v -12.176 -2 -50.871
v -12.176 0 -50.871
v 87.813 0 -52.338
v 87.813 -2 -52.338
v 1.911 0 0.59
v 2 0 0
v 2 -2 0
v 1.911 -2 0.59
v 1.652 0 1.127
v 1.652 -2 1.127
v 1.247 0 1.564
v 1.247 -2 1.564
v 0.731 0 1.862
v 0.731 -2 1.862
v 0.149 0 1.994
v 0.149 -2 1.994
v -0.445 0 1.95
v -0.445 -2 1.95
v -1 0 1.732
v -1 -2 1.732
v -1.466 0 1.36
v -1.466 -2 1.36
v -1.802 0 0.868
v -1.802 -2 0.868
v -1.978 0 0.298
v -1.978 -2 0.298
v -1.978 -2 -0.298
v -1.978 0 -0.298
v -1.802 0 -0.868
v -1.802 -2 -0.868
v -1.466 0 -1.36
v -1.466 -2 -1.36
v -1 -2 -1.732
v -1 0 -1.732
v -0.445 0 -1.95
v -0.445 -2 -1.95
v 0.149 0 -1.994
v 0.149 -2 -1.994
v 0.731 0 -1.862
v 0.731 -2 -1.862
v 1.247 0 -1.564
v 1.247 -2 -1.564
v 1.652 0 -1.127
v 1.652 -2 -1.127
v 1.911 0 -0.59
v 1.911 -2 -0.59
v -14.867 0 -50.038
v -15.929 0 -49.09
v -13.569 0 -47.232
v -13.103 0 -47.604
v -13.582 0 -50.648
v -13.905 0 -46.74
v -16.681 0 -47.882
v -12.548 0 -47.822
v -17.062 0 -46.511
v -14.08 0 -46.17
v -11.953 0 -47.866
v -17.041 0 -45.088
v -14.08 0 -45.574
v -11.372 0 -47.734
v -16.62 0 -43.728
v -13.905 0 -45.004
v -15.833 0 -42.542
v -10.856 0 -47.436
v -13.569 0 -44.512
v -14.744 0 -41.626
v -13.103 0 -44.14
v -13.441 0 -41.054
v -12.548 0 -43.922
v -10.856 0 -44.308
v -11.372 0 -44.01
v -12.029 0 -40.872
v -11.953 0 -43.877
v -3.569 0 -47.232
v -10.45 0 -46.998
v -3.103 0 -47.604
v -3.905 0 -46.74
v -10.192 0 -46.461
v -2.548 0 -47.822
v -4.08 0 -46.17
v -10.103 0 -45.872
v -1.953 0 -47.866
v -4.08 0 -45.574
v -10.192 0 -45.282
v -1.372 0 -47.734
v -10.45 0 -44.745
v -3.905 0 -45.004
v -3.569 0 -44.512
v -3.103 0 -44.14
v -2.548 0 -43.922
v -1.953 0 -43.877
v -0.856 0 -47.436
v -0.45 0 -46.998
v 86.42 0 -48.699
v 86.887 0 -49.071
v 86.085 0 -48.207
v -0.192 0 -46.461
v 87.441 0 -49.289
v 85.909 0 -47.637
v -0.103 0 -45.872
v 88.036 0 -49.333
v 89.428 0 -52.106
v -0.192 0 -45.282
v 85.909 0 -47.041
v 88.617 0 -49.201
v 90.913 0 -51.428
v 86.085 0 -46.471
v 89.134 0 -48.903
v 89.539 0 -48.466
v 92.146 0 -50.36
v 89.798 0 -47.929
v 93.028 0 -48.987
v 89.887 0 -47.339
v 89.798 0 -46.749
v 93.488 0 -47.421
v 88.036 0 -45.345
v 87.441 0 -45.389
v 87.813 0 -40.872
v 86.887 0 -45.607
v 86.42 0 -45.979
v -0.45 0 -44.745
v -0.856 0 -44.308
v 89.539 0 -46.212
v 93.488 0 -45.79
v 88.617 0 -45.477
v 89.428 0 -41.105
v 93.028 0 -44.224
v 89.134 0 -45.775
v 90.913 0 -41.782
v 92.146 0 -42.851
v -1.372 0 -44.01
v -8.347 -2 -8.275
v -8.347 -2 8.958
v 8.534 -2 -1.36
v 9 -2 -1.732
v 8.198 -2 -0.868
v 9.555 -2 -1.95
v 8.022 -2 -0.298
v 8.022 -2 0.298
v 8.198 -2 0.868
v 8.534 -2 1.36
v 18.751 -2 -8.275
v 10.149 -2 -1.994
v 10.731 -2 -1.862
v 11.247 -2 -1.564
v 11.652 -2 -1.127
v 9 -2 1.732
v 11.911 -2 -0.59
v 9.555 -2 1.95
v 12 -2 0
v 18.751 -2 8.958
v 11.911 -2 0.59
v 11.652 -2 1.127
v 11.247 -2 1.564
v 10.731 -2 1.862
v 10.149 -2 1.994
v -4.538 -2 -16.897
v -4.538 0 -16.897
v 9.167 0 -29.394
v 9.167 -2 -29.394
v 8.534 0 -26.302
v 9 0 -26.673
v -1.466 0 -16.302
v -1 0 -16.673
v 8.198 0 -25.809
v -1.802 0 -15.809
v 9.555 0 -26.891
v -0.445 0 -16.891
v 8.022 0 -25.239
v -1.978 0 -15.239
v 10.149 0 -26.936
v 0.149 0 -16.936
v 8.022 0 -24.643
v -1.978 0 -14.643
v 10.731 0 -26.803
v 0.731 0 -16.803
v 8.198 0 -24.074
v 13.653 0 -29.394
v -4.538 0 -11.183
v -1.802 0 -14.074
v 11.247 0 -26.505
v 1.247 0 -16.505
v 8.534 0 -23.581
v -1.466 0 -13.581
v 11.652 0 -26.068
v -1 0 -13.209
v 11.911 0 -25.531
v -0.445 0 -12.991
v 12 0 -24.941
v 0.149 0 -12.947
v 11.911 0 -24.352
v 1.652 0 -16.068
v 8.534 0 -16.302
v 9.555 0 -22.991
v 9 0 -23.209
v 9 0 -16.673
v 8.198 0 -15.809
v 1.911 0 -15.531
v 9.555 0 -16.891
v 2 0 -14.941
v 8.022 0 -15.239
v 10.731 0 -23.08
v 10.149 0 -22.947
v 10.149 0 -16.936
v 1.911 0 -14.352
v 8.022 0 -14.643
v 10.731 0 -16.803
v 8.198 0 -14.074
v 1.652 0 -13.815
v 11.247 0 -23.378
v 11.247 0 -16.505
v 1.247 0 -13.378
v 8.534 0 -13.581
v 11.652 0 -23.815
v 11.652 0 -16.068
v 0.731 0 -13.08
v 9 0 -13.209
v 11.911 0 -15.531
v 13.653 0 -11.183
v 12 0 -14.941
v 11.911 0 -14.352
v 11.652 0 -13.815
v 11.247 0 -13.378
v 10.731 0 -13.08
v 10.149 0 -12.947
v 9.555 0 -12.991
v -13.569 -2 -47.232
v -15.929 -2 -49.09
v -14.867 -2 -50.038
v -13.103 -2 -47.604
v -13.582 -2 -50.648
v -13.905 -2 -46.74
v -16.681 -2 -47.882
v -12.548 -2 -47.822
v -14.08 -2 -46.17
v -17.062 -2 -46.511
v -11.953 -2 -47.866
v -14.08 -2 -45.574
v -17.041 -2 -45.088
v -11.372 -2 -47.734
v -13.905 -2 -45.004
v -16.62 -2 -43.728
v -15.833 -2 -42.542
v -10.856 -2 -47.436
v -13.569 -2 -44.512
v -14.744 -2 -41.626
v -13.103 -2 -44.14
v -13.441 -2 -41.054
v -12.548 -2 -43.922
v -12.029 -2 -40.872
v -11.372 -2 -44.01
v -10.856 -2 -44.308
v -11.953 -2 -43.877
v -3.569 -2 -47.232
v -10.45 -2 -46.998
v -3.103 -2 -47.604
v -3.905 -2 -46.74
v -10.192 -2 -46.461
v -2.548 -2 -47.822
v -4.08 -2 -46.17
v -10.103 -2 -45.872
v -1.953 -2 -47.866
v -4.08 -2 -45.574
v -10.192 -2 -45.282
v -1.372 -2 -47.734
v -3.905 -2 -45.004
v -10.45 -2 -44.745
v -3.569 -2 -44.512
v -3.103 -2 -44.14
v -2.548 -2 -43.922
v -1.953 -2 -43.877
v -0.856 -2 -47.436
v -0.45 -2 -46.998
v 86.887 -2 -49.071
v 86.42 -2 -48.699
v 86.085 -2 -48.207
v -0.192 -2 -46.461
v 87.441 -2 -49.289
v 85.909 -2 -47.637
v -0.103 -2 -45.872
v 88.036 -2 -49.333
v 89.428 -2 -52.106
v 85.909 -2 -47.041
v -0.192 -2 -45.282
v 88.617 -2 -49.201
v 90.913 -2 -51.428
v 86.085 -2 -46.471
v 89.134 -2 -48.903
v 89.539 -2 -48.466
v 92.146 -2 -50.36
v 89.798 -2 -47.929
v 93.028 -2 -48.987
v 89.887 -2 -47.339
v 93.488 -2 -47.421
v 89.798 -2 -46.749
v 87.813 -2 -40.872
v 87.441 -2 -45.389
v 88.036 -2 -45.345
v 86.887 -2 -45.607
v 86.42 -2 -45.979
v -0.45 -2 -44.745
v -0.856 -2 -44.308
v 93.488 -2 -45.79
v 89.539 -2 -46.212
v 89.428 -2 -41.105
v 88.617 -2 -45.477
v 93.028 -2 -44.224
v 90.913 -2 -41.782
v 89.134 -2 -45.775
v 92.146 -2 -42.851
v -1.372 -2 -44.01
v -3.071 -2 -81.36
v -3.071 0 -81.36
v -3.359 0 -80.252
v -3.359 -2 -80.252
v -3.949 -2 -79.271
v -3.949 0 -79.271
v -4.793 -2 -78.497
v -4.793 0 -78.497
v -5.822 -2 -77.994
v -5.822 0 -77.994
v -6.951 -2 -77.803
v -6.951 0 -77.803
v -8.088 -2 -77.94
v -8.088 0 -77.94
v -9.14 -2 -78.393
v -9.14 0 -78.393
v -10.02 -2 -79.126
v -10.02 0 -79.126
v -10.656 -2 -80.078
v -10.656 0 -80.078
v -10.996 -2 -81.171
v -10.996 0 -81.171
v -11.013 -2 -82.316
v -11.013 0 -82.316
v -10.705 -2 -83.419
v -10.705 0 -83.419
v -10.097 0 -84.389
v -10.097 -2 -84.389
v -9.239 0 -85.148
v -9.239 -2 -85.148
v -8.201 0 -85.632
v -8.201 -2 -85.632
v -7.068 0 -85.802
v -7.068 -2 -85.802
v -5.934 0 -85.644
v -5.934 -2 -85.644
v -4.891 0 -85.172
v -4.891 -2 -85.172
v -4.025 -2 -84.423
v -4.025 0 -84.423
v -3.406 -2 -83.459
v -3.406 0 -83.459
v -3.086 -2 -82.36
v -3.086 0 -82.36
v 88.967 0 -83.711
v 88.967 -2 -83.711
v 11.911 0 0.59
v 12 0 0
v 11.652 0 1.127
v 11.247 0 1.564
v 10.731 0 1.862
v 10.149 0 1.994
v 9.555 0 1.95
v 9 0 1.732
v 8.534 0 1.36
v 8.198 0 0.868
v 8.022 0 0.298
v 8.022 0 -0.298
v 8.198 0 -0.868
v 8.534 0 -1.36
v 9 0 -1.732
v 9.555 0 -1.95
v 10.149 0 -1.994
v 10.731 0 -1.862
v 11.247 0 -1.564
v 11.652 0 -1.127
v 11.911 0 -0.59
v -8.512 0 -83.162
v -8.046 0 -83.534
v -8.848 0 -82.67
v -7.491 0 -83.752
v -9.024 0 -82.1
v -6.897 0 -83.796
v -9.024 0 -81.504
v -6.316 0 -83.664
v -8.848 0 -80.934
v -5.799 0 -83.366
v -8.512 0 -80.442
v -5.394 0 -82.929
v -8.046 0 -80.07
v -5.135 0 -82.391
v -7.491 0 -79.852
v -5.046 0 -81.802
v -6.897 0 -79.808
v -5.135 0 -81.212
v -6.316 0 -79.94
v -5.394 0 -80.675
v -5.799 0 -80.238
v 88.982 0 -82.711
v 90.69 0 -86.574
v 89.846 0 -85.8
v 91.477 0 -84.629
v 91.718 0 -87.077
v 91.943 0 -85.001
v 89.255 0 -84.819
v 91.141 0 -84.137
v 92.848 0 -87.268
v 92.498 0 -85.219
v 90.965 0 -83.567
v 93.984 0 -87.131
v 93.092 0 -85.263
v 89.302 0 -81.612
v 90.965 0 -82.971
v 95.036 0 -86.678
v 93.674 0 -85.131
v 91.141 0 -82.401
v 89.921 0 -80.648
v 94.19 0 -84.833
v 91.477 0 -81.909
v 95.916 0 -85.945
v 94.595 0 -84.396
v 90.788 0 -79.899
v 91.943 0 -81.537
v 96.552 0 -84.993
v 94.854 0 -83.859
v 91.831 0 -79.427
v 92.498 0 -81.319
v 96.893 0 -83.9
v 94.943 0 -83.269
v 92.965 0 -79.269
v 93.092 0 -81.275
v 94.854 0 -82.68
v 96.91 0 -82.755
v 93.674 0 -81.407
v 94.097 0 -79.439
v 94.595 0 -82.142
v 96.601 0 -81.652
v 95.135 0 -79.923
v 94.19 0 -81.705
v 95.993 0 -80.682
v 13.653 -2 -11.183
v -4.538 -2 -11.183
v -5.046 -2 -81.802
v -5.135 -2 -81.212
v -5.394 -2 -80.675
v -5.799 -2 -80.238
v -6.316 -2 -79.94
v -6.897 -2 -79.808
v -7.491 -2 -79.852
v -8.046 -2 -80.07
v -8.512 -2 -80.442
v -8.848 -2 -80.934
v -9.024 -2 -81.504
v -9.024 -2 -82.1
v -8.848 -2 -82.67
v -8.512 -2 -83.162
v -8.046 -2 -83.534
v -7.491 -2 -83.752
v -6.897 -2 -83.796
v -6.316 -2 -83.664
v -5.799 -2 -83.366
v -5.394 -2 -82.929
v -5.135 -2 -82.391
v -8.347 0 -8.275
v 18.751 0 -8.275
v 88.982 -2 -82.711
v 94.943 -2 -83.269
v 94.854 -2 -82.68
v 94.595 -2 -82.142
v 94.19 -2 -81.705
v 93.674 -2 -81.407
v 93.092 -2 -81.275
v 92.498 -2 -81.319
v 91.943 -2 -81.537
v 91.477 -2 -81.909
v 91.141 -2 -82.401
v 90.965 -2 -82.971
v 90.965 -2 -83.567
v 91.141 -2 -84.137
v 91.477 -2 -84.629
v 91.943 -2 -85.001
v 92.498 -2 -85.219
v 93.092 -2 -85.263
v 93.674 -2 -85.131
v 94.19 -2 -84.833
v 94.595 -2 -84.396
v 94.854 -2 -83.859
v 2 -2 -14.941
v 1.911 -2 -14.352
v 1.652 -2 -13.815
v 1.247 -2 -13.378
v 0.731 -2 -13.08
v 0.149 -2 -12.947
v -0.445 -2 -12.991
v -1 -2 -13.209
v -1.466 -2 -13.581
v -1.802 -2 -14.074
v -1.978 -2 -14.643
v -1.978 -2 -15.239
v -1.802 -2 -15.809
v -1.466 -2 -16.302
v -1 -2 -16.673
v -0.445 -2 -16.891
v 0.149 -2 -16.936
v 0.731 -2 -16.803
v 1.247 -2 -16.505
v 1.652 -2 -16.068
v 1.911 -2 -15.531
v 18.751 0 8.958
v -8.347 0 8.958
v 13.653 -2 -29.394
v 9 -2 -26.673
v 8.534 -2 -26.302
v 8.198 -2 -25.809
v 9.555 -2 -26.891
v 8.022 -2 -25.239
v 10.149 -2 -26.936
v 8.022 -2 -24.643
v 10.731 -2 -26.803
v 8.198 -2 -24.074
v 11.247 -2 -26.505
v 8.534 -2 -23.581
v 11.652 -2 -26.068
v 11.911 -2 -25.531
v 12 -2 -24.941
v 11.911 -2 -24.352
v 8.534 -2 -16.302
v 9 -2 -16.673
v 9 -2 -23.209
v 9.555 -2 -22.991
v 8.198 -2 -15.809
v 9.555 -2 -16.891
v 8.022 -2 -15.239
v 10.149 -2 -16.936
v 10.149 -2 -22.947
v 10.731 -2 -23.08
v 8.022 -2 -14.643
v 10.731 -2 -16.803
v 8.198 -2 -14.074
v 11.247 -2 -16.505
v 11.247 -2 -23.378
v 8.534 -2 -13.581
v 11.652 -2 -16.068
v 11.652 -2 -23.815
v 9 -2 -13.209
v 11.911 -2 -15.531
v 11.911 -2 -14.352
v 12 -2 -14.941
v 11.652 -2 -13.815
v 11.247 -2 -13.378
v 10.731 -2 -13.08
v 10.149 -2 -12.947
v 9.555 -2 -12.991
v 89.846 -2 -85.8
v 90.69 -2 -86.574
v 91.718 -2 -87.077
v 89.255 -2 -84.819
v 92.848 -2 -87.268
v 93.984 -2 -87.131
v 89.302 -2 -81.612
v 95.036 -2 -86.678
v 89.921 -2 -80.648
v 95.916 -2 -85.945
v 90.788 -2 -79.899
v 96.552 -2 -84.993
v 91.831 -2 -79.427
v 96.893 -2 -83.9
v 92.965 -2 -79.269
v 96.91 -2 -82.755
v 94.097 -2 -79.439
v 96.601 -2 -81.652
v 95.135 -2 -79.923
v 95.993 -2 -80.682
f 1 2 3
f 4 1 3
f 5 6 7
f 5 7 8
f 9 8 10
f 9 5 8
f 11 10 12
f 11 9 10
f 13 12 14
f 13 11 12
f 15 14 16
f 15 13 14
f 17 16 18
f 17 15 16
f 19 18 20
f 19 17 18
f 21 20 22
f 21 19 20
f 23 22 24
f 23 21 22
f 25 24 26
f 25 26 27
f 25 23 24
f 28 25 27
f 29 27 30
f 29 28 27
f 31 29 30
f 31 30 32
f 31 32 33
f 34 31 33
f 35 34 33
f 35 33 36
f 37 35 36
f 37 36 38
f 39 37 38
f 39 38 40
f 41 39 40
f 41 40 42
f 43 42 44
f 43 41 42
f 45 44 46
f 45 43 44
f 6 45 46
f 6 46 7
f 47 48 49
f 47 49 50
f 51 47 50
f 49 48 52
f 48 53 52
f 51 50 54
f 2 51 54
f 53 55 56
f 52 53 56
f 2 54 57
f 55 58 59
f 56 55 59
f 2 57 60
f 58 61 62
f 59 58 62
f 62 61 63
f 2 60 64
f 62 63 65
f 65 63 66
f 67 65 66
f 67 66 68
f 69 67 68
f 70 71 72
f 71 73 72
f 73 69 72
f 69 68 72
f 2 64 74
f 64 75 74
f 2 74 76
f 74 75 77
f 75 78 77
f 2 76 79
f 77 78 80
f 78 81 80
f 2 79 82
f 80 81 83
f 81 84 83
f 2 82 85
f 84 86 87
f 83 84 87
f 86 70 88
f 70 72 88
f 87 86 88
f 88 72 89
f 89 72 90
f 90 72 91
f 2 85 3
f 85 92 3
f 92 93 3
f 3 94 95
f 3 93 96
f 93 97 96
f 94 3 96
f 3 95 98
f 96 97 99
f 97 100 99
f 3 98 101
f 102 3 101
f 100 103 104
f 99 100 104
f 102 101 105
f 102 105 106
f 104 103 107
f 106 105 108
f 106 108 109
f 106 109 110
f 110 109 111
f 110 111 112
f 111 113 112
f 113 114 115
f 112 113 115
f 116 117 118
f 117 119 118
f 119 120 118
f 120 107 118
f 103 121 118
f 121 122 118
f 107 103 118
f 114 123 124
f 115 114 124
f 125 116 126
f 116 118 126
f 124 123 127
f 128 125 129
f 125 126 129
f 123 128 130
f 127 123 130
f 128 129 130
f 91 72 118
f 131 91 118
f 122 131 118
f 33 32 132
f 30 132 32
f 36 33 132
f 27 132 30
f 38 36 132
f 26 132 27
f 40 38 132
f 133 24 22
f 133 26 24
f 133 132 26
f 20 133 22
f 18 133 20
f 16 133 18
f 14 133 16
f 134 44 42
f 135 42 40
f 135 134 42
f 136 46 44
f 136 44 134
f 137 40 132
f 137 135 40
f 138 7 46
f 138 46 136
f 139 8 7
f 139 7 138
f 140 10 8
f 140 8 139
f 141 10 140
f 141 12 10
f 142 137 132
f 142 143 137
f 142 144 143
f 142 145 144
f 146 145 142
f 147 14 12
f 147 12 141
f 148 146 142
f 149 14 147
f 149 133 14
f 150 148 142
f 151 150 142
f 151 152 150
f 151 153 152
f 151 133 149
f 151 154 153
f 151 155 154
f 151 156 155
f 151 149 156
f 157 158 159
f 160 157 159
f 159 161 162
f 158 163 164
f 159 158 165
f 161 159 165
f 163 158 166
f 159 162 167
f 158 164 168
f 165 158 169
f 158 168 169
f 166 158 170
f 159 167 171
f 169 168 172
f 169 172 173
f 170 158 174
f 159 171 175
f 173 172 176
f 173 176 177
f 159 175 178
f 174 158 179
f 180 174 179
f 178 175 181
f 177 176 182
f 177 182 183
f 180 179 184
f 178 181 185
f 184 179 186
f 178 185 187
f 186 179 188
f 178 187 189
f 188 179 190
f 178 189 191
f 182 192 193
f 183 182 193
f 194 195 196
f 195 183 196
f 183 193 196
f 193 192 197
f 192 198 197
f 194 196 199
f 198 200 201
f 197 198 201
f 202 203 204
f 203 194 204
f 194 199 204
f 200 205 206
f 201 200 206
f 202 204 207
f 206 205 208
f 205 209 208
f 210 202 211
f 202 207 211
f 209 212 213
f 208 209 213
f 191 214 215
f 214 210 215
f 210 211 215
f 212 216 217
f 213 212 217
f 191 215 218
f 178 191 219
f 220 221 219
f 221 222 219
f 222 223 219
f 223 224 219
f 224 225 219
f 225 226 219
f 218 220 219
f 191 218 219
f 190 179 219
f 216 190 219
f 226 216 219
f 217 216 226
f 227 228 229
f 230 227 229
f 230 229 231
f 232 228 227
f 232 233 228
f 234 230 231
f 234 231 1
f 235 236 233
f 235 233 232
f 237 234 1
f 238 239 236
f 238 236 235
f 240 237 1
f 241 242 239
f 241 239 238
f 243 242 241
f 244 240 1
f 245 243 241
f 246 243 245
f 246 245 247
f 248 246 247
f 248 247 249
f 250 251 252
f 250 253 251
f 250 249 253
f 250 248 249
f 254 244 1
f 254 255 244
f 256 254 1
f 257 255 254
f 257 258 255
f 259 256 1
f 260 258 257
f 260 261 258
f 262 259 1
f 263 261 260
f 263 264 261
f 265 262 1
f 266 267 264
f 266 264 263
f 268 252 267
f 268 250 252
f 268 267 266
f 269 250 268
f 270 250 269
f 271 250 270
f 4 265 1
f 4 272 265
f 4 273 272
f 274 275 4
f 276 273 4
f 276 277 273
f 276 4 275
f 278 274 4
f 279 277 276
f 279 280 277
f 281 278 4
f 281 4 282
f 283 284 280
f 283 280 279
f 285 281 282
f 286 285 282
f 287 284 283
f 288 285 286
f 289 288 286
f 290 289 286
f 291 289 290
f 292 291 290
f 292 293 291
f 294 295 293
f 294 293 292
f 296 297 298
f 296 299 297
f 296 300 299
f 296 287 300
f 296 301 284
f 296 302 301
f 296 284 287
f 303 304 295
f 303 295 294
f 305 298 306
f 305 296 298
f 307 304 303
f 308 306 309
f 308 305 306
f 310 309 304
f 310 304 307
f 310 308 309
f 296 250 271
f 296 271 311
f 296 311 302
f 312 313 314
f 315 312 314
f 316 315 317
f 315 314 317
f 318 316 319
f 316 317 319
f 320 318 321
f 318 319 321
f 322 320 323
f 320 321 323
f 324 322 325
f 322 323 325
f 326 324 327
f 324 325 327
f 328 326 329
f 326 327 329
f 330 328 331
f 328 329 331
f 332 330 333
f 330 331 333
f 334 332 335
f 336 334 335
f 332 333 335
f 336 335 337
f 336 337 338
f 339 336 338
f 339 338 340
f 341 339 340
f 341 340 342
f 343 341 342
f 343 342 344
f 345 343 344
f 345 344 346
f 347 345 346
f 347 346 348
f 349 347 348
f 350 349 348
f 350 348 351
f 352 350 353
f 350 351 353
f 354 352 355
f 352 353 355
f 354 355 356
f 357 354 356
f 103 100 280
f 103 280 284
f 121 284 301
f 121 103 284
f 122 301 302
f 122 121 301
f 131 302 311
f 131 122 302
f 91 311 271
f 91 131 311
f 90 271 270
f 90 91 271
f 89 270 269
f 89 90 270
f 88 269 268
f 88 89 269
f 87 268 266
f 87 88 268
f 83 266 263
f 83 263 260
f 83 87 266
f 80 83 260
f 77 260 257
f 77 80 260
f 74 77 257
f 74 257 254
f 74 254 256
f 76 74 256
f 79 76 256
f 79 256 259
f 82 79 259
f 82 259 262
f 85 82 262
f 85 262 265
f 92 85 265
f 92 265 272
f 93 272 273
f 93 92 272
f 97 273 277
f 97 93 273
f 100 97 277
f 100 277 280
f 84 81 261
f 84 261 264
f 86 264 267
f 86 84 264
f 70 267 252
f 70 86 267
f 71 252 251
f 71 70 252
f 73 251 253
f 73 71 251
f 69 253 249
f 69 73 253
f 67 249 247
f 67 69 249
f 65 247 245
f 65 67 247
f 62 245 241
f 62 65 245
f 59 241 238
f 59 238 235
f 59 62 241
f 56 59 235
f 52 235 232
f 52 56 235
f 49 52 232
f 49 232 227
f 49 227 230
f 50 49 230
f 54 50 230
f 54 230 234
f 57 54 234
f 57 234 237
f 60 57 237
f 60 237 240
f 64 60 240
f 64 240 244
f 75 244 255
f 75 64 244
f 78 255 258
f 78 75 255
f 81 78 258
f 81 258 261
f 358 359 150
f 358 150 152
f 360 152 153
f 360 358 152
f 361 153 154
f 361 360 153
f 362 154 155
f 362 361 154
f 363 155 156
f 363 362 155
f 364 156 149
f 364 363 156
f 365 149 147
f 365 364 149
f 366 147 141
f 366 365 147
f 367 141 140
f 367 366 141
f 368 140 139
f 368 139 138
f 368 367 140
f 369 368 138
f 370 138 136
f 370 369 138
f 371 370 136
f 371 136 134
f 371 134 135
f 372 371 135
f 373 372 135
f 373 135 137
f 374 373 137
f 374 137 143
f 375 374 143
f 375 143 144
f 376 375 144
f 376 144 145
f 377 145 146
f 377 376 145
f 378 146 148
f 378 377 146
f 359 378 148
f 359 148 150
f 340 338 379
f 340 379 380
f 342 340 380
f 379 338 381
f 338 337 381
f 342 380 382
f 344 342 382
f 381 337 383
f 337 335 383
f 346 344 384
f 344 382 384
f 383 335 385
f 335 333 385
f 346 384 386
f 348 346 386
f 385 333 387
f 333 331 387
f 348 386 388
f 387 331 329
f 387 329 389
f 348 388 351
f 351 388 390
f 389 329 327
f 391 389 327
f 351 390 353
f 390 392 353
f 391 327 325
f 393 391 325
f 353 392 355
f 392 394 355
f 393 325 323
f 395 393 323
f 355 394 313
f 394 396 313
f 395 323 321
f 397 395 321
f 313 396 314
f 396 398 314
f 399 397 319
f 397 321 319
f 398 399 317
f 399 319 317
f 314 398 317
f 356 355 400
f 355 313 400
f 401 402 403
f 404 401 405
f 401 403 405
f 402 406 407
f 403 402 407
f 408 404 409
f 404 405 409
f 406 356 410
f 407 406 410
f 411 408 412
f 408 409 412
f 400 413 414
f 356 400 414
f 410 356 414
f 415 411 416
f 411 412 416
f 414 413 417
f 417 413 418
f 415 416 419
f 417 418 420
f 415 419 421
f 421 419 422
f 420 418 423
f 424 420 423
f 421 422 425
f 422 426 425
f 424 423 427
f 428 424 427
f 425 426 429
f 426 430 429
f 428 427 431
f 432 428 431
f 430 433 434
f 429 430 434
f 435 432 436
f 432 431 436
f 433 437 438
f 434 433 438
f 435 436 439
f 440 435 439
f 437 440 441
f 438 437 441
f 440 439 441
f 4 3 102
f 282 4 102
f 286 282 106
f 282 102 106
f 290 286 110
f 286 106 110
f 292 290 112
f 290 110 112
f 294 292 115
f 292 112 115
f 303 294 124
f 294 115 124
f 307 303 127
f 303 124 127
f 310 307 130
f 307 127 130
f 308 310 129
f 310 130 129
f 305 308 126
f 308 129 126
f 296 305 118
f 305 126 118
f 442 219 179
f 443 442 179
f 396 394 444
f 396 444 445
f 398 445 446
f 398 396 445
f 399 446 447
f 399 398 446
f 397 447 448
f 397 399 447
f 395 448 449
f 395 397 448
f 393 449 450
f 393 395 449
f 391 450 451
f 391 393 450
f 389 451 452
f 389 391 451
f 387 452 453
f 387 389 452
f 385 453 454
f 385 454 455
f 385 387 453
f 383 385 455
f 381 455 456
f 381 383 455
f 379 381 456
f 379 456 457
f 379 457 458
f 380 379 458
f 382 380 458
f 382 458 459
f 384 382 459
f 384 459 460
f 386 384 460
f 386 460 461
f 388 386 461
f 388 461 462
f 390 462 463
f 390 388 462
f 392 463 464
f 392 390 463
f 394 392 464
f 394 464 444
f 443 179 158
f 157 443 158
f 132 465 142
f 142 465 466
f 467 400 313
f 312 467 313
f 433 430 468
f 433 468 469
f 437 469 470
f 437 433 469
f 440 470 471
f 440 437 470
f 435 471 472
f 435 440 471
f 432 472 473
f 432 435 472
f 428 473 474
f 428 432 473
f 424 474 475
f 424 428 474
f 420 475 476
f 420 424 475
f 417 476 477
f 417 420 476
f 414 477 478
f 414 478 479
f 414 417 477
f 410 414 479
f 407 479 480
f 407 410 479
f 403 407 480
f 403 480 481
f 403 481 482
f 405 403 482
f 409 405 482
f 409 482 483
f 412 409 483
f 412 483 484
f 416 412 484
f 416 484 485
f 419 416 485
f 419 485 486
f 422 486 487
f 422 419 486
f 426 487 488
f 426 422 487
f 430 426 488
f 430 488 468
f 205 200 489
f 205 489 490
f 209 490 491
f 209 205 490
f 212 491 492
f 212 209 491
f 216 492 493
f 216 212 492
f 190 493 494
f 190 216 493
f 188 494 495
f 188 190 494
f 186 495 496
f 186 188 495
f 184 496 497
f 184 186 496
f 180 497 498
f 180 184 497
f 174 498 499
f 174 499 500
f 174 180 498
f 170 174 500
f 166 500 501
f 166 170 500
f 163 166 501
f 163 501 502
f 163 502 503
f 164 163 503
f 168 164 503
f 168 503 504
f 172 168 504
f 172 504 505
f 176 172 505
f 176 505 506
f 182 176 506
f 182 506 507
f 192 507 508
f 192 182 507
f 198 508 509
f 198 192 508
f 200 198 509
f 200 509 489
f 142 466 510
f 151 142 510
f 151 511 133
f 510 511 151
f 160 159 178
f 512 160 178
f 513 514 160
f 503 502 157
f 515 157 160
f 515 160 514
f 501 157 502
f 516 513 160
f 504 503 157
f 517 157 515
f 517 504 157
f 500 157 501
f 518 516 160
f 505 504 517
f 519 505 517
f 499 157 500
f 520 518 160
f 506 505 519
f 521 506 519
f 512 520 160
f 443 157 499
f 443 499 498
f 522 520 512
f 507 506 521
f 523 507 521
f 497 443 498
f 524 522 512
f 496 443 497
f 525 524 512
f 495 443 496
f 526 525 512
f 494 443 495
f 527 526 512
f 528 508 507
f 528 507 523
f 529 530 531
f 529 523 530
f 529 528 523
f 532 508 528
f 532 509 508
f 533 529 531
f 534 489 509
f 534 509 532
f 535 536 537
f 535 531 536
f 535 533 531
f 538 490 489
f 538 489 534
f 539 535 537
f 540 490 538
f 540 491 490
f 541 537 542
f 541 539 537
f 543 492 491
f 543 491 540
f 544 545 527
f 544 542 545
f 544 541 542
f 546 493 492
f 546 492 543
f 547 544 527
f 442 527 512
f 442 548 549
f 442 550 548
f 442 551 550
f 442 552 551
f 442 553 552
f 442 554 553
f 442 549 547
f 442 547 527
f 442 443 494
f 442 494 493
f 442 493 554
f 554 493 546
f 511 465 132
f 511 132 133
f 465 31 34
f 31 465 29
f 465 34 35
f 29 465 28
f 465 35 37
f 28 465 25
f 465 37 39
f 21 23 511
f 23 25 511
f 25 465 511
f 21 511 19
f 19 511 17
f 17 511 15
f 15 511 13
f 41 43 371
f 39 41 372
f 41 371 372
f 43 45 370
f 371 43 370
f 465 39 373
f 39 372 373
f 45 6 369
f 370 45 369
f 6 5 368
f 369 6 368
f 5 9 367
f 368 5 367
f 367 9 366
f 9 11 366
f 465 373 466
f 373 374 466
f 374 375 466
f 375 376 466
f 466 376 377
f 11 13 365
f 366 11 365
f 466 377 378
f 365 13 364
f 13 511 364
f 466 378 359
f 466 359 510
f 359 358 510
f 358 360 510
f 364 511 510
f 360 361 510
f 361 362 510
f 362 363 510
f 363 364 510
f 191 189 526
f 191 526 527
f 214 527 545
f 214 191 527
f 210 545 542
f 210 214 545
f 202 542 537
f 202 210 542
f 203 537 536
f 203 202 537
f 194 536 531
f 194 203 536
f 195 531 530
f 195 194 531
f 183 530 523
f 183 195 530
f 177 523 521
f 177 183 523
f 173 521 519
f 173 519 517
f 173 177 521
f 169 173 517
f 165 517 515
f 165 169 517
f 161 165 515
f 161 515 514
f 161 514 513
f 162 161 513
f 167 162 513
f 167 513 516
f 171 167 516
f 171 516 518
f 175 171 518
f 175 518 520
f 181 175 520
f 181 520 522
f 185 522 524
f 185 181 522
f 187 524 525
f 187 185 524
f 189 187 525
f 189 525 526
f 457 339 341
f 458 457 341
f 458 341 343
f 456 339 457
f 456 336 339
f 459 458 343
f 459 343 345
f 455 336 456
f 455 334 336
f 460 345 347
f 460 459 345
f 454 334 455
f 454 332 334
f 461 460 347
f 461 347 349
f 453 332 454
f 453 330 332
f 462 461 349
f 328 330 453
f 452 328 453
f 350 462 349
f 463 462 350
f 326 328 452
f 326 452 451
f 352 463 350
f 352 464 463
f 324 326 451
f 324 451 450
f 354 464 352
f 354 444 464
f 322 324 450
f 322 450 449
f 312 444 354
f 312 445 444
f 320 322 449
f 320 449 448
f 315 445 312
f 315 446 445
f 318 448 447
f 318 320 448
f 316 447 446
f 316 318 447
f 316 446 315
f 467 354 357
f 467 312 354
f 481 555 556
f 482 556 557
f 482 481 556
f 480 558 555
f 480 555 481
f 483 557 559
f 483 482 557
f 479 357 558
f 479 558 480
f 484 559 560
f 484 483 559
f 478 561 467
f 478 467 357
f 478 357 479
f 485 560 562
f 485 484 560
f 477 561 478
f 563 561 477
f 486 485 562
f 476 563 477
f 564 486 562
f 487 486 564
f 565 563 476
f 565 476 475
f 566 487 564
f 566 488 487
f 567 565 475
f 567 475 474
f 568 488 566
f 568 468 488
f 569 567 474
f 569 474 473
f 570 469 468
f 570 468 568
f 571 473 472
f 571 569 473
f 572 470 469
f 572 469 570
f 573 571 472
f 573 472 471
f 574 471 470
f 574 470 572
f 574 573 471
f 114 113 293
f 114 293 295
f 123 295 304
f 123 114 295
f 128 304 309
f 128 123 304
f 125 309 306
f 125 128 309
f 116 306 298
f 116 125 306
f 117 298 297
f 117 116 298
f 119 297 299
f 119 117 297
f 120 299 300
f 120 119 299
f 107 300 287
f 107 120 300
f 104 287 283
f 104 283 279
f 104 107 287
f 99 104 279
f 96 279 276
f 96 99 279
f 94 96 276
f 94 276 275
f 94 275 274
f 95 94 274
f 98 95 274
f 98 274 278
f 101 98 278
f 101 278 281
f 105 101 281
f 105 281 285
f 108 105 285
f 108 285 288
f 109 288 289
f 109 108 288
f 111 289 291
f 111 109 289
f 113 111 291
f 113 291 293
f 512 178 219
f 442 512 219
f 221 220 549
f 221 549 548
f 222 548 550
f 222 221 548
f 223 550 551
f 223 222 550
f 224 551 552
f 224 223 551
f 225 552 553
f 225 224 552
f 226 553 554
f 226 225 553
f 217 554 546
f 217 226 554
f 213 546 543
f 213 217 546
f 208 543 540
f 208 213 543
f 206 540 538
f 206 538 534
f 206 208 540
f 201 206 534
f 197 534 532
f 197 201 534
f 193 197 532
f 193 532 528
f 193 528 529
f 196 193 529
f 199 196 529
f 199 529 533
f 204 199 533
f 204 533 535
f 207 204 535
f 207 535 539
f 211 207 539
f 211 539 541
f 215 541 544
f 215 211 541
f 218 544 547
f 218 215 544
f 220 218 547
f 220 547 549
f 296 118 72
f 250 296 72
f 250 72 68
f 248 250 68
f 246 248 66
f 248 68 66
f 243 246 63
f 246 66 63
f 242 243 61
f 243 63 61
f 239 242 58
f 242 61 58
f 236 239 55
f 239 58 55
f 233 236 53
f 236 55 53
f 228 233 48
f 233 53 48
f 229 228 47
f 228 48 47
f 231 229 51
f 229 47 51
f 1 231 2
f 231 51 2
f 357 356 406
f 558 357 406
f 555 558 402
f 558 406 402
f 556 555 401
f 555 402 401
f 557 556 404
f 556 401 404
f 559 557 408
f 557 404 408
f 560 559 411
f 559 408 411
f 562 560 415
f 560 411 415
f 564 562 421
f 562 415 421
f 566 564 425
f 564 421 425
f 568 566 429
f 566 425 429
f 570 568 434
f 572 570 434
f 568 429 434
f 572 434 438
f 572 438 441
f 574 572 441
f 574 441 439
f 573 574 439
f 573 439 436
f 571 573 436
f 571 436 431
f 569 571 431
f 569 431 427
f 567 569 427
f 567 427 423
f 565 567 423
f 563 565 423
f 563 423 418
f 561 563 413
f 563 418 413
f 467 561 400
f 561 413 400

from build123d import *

# Parameters (mm, degrees)
F0_W     = 27.097531
F0_H     = 17.233416
F0_R     = 2
F1_DEPTH = 2
F2_R     = 2
F3_DEPTH = 2
F4_R     = 2
F5_DEPTH = 2
F6_R     = 2
F7_DEPTH = 2


with BuildPart() as f1:
    # F0 (on Front) → F1 (new body)
    with BuildSketch(Plane.XZ):
        with Locations((5.201902, 0.341227)):
            Rectangle(F0_W, F0_H)
        Circle(F0_R, mode=Mode.SUBTRACT)
        with Locations((10, 0)):
            Circle(F0_R, mode=Mode.SUBTRACT)
    extrude(amount=F1_DEPTH)


with BuildPart() as f3:
    # F2 (on Front) → F3 (new body)
    with BuildSketch(Plane.XZ):
        Polygon((13.652718, -11.182562), (-4.537523, -11.182562), (-4.537523, -16.897279), (9.166907, -29.393673), (13.652718, -29.393673), align=None)
        with Locations((10, -24.941308)):
            Circle(F2_R, mode=Mode.SUBTRACT)
        with Locations((0, -14.941308)):
            Circle(F2_R, mode=Mode.SUBTRACT)
        with Locations((10, -14.941308)):
            Circle(F2_R, mode=Mode.SUBTRACT)
    extrude(amount=F3_DEPTH)


with BuildPart() as f5:
    # F4 (on Front) → F5 (new body)
    with BuildSketch(Plane.XZ):
        with BuildLine():
            Line((87.813167, -40.872386), (-12.029353, -40.872386))
            ThreePointArc((-12.029353, -40.872386), (-17.102173, -45.79849), (-12.176069, -50.87131))
            Line((-12.176069, -50.87131), (87.813167, -52.33847))
            ThreePointArc((87.813167, -52.33847), (93.546209, -46.605428), (87.813167, -40.872386))
        make_face()
        with Locations((87.886525, -47.339007)):
            Circle(F4_R, mode=Mode.SUBTRACT)
        with Locations((-12.102711, -45.871848)):
            Circle(F4_R, mode=Mode.SUBTRACT)
        with Locations((-2.102711, -45.871848)):
            Circle(F4_R, mode=Mode.SUBTRACT)
    extrude(amount=F5_DEPTH)


with BuildPart() as f7:
    # F6 (on Front) → F7 (new body)
    with BuildSketch(Plane.XZ):
        with BuildLine():
            ThreePointArc((88.967314, -83.710812), (96.942419, -83.327779), (88.981985, -82.71092))
            Line((88.981985, -82.71092), (-3.070852, -81.360213))
            ThreePointArc((-3.070852, -81.360213), (-11.045957, -81.743246), (-3.085523, -82.360105))
            Line((-3.085523, -82.360105), (88.967314, -83.710812))
        make_face()
        with Locations((92.942849, -83.269092)):
            Circle(F6_R, mode=Mode.SUBTRACT)
        with Locations((-7.046387, -81.801933)):
            Circle(F6_R, mode=Mode.SUBTRACT)
    extrude(amount=F7_DEPTH)


solid = Compound([f1.part, f3.part, f5.part, f7.part])
